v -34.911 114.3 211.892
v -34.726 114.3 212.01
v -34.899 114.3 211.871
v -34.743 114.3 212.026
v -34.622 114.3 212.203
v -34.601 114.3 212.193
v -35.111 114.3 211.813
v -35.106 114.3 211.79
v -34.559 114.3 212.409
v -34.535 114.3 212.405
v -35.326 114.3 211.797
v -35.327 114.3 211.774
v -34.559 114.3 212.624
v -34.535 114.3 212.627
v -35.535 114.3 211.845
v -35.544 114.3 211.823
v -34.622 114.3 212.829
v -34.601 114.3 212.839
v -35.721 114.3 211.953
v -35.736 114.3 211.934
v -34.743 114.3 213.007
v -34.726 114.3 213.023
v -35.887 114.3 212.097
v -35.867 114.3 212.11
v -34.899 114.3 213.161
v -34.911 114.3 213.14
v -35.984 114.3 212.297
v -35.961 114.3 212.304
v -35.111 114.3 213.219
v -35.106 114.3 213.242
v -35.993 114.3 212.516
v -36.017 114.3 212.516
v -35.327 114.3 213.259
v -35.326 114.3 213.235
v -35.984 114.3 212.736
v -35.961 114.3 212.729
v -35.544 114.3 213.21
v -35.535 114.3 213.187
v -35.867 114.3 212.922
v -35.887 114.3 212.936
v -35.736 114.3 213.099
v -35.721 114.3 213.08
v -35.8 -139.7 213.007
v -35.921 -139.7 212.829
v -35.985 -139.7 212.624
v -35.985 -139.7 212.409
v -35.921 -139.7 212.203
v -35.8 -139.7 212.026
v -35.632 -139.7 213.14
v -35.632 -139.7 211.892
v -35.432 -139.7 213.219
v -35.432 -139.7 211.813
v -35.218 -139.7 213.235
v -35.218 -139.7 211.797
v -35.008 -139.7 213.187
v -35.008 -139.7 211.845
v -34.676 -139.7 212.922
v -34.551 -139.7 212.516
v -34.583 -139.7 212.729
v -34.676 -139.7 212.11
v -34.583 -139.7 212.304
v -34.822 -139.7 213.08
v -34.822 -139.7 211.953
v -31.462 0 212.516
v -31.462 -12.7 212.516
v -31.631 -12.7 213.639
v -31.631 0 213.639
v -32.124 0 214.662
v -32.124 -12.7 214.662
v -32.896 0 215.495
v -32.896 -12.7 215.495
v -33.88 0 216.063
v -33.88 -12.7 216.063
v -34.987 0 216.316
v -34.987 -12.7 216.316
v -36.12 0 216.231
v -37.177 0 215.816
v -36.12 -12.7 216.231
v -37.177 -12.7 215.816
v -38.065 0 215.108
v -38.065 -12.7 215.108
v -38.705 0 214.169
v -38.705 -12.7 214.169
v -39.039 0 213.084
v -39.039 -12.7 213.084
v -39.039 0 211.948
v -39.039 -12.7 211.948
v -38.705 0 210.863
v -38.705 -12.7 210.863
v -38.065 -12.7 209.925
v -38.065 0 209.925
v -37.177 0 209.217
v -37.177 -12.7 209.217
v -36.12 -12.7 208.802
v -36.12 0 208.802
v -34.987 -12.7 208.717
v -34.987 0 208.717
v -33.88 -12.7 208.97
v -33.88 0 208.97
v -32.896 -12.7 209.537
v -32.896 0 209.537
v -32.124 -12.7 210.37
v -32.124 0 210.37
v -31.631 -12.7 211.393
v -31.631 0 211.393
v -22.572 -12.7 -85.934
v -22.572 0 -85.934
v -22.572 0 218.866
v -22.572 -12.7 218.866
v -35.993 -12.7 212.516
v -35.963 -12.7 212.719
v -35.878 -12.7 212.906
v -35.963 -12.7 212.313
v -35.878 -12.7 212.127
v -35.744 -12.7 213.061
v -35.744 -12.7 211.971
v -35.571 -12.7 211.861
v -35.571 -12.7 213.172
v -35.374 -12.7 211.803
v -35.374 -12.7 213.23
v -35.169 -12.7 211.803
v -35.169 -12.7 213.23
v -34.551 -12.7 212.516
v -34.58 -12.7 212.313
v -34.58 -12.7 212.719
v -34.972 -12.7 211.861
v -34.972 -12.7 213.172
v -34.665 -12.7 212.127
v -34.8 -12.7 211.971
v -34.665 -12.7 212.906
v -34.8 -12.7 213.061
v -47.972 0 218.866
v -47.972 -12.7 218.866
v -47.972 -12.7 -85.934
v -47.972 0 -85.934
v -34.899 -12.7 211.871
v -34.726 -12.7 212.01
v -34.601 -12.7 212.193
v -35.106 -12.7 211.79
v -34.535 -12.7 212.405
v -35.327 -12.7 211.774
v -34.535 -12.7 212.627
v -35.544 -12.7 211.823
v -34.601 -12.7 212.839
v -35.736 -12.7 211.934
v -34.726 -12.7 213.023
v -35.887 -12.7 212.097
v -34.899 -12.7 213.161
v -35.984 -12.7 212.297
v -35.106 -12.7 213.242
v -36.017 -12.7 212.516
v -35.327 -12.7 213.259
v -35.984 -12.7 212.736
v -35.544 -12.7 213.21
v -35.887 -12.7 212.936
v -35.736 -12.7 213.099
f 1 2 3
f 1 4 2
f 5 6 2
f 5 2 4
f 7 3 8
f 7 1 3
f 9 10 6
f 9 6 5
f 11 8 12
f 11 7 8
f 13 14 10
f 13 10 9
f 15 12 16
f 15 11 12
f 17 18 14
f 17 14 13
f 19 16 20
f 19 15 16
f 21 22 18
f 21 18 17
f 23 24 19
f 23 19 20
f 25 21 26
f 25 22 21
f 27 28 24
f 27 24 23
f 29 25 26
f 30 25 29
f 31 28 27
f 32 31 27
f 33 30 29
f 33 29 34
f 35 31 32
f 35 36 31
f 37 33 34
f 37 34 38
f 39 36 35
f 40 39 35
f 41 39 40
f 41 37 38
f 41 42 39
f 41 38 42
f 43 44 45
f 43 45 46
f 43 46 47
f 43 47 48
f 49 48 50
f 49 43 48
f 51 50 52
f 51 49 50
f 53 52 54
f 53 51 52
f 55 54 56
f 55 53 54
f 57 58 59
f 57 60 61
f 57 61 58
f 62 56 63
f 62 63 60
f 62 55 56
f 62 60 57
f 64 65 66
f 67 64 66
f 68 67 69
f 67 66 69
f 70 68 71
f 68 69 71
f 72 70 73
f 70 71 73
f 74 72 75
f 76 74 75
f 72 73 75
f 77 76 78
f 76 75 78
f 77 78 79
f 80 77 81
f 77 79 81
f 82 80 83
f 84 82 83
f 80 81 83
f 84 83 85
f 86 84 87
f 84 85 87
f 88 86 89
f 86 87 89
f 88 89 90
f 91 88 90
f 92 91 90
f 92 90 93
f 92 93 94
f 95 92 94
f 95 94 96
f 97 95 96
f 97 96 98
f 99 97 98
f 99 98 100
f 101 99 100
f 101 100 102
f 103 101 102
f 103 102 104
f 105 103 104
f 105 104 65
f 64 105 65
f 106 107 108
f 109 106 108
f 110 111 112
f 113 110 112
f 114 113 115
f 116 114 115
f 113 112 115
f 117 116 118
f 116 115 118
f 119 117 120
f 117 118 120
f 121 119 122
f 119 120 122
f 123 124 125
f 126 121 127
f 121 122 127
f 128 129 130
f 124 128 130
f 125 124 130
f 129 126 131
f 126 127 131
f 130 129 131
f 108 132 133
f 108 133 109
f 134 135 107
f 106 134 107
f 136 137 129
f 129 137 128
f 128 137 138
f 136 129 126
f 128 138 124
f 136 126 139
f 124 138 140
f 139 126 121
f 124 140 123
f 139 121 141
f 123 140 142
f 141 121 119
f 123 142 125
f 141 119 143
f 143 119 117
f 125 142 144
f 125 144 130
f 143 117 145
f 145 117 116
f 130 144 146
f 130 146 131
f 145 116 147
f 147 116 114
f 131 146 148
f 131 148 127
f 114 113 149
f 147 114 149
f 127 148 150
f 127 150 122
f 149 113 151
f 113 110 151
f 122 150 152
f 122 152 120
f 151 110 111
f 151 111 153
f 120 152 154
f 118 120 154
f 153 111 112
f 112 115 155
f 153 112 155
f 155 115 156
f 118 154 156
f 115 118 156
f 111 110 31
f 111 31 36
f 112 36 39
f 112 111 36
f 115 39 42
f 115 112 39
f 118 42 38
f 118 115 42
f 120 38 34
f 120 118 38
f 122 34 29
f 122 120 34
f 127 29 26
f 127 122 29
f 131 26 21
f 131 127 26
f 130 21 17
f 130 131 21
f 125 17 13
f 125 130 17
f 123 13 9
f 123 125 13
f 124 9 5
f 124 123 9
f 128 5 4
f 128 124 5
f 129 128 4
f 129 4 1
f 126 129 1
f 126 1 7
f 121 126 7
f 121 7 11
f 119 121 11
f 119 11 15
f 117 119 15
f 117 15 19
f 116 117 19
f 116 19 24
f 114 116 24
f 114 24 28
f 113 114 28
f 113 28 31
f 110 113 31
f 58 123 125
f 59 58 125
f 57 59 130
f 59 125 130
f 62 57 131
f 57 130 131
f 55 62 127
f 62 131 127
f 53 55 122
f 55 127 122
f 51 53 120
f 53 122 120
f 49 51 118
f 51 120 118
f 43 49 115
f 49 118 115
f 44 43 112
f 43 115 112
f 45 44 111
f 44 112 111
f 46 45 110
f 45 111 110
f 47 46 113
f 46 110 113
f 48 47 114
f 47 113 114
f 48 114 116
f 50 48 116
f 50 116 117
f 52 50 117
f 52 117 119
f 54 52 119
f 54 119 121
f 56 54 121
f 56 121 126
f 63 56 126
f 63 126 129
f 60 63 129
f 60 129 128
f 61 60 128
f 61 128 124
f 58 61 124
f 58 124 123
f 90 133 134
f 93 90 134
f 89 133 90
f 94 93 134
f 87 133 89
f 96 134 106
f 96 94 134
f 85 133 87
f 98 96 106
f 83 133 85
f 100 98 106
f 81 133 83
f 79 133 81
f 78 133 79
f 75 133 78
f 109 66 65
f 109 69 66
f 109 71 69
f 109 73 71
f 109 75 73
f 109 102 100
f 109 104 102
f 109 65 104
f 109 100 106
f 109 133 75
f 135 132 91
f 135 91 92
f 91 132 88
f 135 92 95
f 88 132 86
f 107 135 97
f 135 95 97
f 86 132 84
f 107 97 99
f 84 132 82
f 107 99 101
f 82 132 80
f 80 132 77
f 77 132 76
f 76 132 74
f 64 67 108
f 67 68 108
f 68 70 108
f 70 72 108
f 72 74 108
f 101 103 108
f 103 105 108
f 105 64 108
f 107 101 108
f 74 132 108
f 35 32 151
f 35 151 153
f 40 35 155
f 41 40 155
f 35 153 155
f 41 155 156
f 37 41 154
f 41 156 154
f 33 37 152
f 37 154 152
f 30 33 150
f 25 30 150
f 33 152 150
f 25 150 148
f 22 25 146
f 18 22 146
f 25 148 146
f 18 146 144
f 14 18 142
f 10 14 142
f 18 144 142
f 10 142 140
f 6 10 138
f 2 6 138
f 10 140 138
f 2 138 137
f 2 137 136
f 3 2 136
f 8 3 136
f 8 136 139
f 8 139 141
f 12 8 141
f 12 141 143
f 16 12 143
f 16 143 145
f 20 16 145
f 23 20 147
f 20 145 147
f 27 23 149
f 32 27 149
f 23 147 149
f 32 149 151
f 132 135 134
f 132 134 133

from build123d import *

# Parameters (mm, degrees)
F0_W     = 25.4
F0_H     = 304.8
F1_DEPTH = 12.7
F2_R     = 3.81
F3_DEPTH = 25.4
F4_R     = 0.720809
F5_DEPTH = 127
F6_R     = 0.744764
F6_R_2   = 0.720809
F7_DEPTH = 127


with BuildPart() as f1:
    # F0 (on Front) → F1 (new body)
    with BuildSketch(Plane.XZ):
        with Locations((-35.271831, 66.466231)):
            Rectangle(F0_W, F0_H)
    extrude(amount=F1_DEPTH)

    # F2 (on face) → F3 (cut)
    with BuildSketch(Plane.XZ.offset(12.7)):
        with Locations((-35.271831, 212.516231)):
            Circle(F2_R)
    extrude(amount=-F3_DEPTH, mode=Mode.SUBTRACT)


with BuildPart() as f5:
    # F4 (on face) → F5 (new body)
    with BuildSketch(Plane.XZ.offset(12.7)):
        with Locations((-35.271831, 212.516231)):
            Circle(F4_R)
    extrude(amount=F5_DEPTH)

    # F6 (on face) → F7 (join)
    with BuildSketch(Plane(origin=(0, -12.7, 0), x_dir=(-1, 0, 0), z_dir=(0, 1, 0))):
        with Locations((35.271831, 212.516231)):
            Circle(F6_R)
        with Locations((35.271831, 212.516231)):
            Circle(F6_R_2, mode=Mode.SUBTRACT)
    extrude(amount=F7_DEPTH)


solid = Compound([f1.part, f5.part])
